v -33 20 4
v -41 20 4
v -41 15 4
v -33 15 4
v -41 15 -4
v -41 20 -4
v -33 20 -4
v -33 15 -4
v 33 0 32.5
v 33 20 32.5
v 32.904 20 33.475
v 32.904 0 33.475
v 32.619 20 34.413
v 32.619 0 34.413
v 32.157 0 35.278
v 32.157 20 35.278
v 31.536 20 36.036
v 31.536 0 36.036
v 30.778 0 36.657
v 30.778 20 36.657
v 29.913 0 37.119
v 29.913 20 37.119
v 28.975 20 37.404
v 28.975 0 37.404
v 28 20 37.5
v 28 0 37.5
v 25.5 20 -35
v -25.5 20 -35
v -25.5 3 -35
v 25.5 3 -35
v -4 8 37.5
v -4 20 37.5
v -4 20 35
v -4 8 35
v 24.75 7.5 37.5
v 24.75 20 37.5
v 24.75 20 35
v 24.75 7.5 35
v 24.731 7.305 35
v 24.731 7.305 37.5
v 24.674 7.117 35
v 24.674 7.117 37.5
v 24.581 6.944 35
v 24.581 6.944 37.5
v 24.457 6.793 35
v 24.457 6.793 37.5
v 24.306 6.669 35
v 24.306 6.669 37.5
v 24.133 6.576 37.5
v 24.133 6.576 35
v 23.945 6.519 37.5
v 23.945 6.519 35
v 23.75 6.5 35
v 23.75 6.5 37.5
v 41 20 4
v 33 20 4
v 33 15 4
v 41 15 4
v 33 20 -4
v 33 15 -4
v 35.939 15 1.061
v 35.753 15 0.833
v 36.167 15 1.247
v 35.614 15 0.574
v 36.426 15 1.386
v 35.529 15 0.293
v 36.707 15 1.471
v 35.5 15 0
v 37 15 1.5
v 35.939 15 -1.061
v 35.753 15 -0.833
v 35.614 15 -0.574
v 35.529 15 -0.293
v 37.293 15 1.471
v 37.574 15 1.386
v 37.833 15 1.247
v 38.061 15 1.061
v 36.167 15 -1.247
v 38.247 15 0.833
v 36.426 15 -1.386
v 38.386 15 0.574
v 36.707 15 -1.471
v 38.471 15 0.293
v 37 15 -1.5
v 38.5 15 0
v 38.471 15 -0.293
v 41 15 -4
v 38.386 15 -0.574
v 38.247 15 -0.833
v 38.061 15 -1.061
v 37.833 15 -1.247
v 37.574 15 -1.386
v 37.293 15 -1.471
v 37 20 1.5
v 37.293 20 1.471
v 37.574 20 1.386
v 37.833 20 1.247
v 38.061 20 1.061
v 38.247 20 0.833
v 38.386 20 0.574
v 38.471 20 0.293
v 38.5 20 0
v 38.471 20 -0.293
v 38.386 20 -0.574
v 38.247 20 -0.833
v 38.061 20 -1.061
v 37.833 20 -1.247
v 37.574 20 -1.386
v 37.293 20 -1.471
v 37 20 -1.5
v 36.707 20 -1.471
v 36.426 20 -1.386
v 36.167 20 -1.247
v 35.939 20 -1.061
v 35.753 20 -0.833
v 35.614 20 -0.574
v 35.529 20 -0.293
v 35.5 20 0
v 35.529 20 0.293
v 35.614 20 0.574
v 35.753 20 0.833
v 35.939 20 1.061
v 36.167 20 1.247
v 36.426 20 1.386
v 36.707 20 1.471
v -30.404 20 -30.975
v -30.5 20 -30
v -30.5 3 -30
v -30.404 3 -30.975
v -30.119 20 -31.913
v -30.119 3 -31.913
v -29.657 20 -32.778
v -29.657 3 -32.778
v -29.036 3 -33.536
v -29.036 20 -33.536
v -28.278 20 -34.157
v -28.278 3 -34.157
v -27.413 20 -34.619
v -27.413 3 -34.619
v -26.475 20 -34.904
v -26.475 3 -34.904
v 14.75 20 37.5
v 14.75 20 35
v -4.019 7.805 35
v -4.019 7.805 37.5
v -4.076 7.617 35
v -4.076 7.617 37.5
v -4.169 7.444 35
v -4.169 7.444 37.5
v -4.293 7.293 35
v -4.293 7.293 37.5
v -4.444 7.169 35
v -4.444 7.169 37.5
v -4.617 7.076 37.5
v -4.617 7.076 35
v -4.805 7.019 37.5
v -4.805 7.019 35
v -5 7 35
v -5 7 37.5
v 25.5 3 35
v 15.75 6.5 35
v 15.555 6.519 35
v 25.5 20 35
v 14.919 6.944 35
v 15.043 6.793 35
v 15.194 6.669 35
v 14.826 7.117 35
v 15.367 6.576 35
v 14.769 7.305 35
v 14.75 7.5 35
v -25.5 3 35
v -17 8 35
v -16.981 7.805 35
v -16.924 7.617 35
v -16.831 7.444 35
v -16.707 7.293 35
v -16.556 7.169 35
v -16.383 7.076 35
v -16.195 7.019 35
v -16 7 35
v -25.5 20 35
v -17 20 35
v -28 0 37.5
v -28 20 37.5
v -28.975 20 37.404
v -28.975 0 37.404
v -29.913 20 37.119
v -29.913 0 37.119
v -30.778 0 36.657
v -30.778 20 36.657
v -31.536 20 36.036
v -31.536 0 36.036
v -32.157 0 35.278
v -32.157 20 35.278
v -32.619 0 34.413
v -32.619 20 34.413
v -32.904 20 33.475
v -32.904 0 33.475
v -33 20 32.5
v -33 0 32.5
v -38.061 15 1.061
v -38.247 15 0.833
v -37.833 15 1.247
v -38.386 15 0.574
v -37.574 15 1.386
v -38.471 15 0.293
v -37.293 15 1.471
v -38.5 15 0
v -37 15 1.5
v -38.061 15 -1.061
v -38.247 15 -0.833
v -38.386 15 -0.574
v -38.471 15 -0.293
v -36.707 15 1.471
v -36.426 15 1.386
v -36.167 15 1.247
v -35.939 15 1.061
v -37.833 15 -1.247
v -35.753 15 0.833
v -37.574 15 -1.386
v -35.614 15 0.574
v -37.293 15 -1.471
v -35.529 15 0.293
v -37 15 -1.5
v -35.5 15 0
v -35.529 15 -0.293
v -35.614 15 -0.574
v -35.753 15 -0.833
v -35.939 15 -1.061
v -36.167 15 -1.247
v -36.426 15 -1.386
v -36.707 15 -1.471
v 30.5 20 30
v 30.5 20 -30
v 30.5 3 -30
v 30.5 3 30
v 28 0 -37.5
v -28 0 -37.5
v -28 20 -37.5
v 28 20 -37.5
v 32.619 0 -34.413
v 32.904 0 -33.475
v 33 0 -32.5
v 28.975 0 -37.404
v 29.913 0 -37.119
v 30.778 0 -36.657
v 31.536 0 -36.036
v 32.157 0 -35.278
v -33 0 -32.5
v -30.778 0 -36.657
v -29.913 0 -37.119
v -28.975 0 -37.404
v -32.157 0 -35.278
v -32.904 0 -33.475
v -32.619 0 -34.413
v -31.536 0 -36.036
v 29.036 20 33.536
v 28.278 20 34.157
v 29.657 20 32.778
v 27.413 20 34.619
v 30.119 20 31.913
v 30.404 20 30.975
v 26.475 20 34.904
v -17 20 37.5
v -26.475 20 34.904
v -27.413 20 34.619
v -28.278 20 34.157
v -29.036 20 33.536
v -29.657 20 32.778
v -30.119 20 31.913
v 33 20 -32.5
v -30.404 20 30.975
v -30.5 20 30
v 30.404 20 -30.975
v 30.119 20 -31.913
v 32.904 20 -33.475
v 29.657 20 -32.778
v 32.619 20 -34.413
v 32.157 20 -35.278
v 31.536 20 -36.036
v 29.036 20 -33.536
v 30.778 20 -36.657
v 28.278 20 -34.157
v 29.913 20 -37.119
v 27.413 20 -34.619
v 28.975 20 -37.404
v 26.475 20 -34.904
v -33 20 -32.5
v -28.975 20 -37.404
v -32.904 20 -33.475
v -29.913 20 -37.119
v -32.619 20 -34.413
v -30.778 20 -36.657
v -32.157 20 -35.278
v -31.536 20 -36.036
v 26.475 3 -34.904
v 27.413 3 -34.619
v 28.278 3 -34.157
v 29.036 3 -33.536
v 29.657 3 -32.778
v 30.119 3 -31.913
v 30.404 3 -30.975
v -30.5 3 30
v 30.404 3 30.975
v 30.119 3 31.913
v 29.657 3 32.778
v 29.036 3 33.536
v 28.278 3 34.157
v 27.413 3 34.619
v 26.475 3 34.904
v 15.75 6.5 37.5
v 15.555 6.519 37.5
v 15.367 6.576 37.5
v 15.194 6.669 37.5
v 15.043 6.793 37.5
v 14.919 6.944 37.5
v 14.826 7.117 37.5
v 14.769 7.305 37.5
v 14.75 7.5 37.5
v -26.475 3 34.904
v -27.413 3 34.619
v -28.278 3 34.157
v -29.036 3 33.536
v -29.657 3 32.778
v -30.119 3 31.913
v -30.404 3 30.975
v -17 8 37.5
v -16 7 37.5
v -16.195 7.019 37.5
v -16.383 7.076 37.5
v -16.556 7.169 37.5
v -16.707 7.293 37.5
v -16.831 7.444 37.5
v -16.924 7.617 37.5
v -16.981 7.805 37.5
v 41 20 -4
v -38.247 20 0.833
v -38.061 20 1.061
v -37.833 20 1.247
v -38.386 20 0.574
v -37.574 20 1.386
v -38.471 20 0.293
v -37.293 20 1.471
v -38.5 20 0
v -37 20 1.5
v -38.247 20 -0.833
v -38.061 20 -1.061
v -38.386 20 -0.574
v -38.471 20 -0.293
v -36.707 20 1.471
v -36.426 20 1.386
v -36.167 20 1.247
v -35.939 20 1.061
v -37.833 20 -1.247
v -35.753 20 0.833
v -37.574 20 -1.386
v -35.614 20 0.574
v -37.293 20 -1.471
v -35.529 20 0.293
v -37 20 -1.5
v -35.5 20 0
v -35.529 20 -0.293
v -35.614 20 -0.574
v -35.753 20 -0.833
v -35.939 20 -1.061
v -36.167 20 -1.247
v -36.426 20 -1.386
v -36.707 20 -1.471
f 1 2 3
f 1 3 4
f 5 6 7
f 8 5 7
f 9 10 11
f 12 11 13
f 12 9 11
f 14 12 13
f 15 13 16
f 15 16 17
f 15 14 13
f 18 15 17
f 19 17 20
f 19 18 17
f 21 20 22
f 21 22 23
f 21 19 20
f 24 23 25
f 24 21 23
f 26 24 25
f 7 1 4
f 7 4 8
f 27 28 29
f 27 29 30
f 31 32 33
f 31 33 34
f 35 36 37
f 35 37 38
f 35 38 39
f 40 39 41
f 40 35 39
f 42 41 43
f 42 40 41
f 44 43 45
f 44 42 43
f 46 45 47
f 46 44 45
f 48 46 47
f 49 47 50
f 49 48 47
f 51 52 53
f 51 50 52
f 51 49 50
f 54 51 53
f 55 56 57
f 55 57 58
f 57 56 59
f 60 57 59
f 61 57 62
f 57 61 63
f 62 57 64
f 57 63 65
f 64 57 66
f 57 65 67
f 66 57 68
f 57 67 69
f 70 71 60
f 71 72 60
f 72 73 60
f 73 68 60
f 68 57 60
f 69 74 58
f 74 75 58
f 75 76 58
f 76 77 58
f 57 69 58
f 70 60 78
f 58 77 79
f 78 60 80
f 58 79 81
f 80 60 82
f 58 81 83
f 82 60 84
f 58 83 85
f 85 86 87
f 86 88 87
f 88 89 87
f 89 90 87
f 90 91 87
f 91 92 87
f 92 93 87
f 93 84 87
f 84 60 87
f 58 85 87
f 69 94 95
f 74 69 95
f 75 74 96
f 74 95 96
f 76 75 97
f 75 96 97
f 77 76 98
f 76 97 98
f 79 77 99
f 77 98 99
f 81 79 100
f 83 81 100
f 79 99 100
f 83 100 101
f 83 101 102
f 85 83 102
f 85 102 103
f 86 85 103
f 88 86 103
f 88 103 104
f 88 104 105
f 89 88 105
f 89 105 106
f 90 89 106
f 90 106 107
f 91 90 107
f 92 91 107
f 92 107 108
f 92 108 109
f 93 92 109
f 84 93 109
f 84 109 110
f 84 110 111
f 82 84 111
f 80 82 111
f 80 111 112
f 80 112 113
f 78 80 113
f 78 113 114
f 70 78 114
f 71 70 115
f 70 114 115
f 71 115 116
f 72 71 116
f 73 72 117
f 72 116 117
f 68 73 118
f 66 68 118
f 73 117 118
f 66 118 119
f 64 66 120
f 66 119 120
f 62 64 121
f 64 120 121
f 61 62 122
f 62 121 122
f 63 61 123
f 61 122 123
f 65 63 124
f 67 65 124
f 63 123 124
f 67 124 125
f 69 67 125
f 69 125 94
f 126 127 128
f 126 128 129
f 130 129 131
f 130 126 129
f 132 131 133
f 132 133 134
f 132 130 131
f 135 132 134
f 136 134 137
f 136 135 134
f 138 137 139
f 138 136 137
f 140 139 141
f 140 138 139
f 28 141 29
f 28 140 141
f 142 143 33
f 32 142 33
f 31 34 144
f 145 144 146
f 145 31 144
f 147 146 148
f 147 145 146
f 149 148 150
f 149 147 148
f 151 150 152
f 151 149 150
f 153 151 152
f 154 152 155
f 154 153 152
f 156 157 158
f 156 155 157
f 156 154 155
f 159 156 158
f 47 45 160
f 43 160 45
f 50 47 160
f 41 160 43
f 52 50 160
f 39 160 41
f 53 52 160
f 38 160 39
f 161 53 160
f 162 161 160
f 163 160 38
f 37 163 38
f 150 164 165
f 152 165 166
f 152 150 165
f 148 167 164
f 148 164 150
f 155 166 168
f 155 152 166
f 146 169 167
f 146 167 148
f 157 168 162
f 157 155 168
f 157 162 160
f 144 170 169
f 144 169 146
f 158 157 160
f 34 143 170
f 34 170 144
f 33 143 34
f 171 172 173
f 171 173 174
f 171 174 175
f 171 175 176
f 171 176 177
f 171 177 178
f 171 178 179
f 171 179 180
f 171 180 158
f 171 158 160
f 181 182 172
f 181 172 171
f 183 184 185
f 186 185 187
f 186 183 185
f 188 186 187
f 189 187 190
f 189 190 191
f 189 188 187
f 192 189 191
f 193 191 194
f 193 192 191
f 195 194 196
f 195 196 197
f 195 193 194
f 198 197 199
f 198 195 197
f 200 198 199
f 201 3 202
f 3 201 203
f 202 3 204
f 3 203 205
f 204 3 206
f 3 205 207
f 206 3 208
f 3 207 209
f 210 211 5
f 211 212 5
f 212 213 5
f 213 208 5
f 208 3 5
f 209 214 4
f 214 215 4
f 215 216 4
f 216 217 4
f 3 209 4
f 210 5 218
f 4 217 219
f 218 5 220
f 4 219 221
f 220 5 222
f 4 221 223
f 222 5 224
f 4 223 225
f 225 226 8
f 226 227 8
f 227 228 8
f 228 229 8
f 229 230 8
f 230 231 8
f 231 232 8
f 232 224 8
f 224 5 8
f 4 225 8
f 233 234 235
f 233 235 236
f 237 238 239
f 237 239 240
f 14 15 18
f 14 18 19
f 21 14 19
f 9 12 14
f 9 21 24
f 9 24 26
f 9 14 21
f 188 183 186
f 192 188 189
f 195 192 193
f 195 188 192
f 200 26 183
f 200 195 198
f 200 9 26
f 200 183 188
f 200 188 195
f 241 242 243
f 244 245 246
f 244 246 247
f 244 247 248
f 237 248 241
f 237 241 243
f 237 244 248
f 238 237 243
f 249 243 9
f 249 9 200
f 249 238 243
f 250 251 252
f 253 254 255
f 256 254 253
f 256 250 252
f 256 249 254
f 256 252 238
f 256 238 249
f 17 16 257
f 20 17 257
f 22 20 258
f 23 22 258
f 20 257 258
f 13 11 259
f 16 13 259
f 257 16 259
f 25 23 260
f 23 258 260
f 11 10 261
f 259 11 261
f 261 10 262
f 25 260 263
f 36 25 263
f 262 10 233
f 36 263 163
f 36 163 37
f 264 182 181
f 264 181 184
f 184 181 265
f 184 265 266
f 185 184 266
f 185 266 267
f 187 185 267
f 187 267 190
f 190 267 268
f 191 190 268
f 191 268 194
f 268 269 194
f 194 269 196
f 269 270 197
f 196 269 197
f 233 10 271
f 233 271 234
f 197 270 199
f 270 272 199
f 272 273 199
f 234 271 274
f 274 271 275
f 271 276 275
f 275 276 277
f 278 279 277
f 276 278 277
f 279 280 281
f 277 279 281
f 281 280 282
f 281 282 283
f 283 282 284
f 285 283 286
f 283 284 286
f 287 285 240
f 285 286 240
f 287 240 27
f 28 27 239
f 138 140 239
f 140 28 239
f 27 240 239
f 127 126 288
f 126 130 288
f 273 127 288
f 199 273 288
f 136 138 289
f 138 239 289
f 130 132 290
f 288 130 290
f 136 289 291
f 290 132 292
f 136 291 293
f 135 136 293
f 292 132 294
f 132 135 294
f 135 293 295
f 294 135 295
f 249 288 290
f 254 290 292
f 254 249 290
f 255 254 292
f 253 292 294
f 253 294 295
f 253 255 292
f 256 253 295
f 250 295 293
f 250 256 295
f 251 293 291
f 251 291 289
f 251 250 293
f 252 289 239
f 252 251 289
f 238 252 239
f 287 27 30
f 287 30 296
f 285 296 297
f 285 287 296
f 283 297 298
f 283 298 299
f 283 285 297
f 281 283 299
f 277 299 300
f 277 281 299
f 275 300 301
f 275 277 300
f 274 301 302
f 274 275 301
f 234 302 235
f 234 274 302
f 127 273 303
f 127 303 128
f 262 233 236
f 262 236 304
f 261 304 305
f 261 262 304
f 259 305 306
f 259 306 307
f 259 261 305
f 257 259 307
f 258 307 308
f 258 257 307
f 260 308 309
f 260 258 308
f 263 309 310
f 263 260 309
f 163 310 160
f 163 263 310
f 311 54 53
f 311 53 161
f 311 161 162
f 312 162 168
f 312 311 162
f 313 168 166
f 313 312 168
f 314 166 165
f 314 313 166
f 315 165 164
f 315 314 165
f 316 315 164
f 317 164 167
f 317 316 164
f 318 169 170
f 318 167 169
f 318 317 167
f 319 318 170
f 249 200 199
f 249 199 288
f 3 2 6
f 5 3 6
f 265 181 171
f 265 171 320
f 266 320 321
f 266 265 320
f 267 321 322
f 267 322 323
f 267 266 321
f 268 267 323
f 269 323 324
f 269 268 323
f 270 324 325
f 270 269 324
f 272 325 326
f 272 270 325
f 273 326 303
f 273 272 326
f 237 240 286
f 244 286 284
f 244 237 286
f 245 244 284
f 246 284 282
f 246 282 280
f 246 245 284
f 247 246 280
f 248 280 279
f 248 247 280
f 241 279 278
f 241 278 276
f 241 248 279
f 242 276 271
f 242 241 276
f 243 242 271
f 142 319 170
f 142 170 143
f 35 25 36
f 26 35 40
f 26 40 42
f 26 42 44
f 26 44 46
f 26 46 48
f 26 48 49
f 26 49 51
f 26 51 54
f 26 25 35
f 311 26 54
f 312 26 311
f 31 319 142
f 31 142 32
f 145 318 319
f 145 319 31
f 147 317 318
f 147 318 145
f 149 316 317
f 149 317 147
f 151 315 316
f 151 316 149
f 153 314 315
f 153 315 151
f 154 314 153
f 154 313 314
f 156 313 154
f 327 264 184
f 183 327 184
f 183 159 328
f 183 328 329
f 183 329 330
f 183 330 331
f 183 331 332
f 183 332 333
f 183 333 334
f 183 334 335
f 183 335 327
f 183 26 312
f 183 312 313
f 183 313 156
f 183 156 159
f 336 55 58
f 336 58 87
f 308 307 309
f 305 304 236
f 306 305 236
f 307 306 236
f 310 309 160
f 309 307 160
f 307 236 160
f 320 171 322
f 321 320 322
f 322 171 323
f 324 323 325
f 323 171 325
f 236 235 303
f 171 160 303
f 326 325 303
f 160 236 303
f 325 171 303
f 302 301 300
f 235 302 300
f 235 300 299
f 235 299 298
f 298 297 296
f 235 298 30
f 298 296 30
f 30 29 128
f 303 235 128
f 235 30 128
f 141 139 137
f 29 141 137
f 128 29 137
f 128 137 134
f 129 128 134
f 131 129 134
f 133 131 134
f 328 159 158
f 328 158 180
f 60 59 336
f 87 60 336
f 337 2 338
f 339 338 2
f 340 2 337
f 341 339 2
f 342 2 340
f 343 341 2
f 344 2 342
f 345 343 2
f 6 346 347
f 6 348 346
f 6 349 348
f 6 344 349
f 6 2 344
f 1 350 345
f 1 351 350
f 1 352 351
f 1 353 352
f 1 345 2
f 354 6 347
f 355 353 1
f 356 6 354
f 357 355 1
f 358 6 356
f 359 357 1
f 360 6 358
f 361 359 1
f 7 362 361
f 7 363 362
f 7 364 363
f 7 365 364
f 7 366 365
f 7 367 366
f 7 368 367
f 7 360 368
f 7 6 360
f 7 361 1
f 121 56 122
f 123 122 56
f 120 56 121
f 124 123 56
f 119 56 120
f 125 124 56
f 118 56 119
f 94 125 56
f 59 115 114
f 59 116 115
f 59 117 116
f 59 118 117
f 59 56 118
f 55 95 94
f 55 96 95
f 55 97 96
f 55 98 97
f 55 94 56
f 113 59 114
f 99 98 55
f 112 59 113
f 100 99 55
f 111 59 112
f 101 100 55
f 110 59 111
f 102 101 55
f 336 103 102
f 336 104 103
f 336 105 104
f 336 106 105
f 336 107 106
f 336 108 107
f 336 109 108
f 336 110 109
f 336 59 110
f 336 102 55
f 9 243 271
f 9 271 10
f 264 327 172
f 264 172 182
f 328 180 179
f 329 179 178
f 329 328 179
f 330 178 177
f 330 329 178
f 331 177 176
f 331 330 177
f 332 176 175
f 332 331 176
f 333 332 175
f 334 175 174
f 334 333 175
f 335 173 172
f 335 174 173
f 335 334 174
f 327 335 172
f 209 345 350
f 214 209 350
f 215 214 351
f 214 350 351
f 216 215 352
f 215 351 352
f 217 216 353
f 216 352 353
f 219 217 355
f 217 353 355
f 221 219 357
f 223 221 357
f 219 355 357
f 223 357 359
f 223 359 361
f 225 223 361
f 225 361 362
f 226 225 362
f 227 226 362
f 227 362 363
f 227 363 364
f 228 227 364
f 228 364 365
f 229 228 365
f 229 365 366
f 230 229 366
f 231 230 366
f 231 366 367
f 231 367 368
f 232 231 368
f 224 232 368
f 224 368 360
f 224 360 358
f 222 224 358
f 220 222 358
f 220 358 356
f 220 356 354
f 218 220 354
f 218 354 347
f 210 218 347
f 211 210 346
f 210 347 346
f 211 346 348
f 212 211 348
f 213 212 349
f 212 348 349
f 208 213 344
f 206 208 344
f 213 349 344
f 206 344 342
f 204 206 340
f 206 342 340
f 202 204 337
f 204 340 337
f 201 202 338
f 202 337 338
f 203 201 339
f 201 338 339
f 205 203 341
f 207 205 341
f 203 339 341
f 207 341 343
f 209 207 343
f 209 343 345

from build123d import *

# Parameters (mm, degrees)
AUFSATZ_LINEAR_AUSTRAGEN1_DEPTH   = 20
SCHNITT_LINEAR_AUSTRAGEN1_DEPTH   = 17
SCHNITT_LINEAR_AUSTRAGEN2_DEPTH   = 17
SKIZZE5_W                         = 8
SKIZZE5_H                         = 8
AUFSATZ_LINEAR_AUSTRAGEN2_DEPTH   = 5
AUFSATZ_LINEAR_AUSTRAGEN2_2_DEPTH = 5
SKIZZE6_R                         = 1.5
SCHNITT_LINEAR_AUSTRAGEN3_DEPTH   = 10


with BuildPart() as part:
    # Skizze1 → Aufsatz-Linear austragen1 (new body)
    with BuildSketch(Plane(origin=(0, 0, 0), x_dir=(1, 0, 0), z_dir=(0, 1, 0))):
        with BuildLine():
            Line((28, -37.5), (-28, -37.5))
            ThreePointArc((-28, -37.5), (-31.535533906, -36.035533906), (-33, -32.5))
            Line((-33, -32.5), (-33, 32.5))
            ThreePointArc((-33, 32.5), (-31.535533906, 36.035533906), (-28, 37.5))
            Line((-28, 37.5), (28, 37.5))
            ThreePointArc((28, 37.5), (31.535533906, 36.035533906), (33, 32.5))
            Line((33, 32.5), (33, -32.5))
            ThreePointArc((33, -32.5), (31.535533906, -36.035533906), (28, -37.5))
        make_face()
    extrude(amount=AUFSATZ_LINEAR_AUSTRAGEN1_DEPTH)

    # Skizze2 → Schnitt-Linear austragen1 (cut)
    with BuildSketch(Plane(origin=(0, 20, 0), x_dir=(1, 0, 0), z_dir=(0, 1, 0))):
        with BuildLine():
            Line((-25.5, 35), (25.5, 35))
            ThreePointArc((25.5, 35), (29.035533906, 33.535533906), (30.5, 30))
            Line((30.5, 30), (30.5, -30))
            ThreePointArc((30.5, -30), (29.035533906, -33.535533906), (25.5, -35))
            Line((25.5, -35), (-25.5, -35))
            ThreePointArc((-25.5, -35), (-29.035533906, -33.535533906), (-30.5, -30))
            Line((-30.5, -30), (-30.5, 30))
            ThreePointArc((-30.5, 30), (-29.035533906, 33.535533906), (-25.5, 35))
        make_face()
    extrude(amount=-SCHNITT_LINEAR_AUSTRAGEN1_DEPTH, mode=Mode.SUBTRACT)

    # Skizze4 → Schnitt-Linear austragen2 (cut)
    with BuildSketch(Plane.XY.offset(37.5)):
        with BuildLine():
            Line((-16, 22), (-5, 22))
            ThreePointArc((-5, 22), (-4.292893219, 21.707106781), (-4, 21))
            Line((-4, 21), (-4, 8))
            ThreePointArc((-4, 8), (-4.292893219, 7.292893219), (-5, 7))
            Line((-5, 7), (-16, 7))
            ThreePointArc((-16, 7), (-16.707106781, 7.292893219), (-17, 8))
            Line((-17, 8), (-17, 21))
            ThreePointArc((-17, 21), (-16.707106781, 21.707106781), (-16, 22))
        make_face()
        with BuildLine():
            Line((15.75, 21.5), (23.75, 21.5))
            ThreePointArc((23.75, 21.5), (24.457106781, 21.207106781), (24.75, 20.5))
            Line((24.75, 20.5), (24.75, 7.5))
            ThreePointArc((24.75, 7.5), (24.457106781, 6.792893219), (23.75, 6.5))
            Line((23.75, 6.5), (15.75, 6.5))
            ThreePointArc((15.75, 6.5), (15.042893219, 6.792893219), (14.75, 7.5))
            Line((14.75, 7.5), (14.75, 20.5))
            ThreePointArc((14.75, 20.5), (15.042893219, 21.207106781), (15.75, 21.5))
        make_face()
    extrude(amount=-SCHNITT_LINEAR_AUSTRAGEN2_DEPTH, mode=Mode.SUBTRACT)


with BuildPart() as body_2:
    # Skizze5 → Aufsatz-Linear austragen2 (new body)
    with BuildSketch(Plane(origin=(0, 20, 0), x_dir=(1, 0, 0), z_dir=(0, 1, 0))):
        with Locations((37, 0)):
            Rectangle(SKIZZE5_W, SKIZZE5_H)
    extrude(amount=-AUFSATZ_LINEAR_AUSTRAGEN2_DEPTH)


with BuildPart() as body_3:
    # Skizze5 → Aufsatz-Linear austragen2 2 (new body)
    with BuildSketch(Plane(origin=(0, 20, 0), x_dir=(1, 0, 0), z_dir=(0, 1, 0))):
        with Locations((-37, 0)):
            Rectangle(SKIZZE5_W, SKIZZE5_H)
    extrude(amount=-AUFSATZ_LINEAR_AUSTRAGEN2_2_DEPTH)


with BuildPart() as schnitt_linear_austragen3_tool:
    # Skizze6 → Schnitt-Linear austragen3 (new body)
    with BuildSketch(Plane(origin=(0, 20, 0), x_dir=(1, 0, 0), z_dir=(0, 1, 0))):
        with Locations(Location((-37, 0, 0), (0, 0, 270))):
            Circle(SKIZZE6_R)
        with Locations(Location((37, 0, 0), (0, 0, 270))):
            Circle(SKIZZE6_R)
    extrude(amount=-SCHNITT_LINEAR_AUSTRAGEN3_DEPTH)


with BuildPart() as body_2_1:
    add(body_2.part)

    # Schnitt-Linear austragen3: cut by schnitt_linear_austragen3_tool
    add(schnitt_linear_austragen3_tool.part, mode=Mode.SUBTRACT)


with BuildPart() as body_3_1:
    add(body_3.part)

    # Schnitt-Linear austragen3: cut by schnitt_linear_austragen3_tool
    add(schnitt_linear_austragen3_tool.part, mode=Mode.SUBTRACT)


solid = Compound([part.part, body_2_1.part, body_3_1.part])
